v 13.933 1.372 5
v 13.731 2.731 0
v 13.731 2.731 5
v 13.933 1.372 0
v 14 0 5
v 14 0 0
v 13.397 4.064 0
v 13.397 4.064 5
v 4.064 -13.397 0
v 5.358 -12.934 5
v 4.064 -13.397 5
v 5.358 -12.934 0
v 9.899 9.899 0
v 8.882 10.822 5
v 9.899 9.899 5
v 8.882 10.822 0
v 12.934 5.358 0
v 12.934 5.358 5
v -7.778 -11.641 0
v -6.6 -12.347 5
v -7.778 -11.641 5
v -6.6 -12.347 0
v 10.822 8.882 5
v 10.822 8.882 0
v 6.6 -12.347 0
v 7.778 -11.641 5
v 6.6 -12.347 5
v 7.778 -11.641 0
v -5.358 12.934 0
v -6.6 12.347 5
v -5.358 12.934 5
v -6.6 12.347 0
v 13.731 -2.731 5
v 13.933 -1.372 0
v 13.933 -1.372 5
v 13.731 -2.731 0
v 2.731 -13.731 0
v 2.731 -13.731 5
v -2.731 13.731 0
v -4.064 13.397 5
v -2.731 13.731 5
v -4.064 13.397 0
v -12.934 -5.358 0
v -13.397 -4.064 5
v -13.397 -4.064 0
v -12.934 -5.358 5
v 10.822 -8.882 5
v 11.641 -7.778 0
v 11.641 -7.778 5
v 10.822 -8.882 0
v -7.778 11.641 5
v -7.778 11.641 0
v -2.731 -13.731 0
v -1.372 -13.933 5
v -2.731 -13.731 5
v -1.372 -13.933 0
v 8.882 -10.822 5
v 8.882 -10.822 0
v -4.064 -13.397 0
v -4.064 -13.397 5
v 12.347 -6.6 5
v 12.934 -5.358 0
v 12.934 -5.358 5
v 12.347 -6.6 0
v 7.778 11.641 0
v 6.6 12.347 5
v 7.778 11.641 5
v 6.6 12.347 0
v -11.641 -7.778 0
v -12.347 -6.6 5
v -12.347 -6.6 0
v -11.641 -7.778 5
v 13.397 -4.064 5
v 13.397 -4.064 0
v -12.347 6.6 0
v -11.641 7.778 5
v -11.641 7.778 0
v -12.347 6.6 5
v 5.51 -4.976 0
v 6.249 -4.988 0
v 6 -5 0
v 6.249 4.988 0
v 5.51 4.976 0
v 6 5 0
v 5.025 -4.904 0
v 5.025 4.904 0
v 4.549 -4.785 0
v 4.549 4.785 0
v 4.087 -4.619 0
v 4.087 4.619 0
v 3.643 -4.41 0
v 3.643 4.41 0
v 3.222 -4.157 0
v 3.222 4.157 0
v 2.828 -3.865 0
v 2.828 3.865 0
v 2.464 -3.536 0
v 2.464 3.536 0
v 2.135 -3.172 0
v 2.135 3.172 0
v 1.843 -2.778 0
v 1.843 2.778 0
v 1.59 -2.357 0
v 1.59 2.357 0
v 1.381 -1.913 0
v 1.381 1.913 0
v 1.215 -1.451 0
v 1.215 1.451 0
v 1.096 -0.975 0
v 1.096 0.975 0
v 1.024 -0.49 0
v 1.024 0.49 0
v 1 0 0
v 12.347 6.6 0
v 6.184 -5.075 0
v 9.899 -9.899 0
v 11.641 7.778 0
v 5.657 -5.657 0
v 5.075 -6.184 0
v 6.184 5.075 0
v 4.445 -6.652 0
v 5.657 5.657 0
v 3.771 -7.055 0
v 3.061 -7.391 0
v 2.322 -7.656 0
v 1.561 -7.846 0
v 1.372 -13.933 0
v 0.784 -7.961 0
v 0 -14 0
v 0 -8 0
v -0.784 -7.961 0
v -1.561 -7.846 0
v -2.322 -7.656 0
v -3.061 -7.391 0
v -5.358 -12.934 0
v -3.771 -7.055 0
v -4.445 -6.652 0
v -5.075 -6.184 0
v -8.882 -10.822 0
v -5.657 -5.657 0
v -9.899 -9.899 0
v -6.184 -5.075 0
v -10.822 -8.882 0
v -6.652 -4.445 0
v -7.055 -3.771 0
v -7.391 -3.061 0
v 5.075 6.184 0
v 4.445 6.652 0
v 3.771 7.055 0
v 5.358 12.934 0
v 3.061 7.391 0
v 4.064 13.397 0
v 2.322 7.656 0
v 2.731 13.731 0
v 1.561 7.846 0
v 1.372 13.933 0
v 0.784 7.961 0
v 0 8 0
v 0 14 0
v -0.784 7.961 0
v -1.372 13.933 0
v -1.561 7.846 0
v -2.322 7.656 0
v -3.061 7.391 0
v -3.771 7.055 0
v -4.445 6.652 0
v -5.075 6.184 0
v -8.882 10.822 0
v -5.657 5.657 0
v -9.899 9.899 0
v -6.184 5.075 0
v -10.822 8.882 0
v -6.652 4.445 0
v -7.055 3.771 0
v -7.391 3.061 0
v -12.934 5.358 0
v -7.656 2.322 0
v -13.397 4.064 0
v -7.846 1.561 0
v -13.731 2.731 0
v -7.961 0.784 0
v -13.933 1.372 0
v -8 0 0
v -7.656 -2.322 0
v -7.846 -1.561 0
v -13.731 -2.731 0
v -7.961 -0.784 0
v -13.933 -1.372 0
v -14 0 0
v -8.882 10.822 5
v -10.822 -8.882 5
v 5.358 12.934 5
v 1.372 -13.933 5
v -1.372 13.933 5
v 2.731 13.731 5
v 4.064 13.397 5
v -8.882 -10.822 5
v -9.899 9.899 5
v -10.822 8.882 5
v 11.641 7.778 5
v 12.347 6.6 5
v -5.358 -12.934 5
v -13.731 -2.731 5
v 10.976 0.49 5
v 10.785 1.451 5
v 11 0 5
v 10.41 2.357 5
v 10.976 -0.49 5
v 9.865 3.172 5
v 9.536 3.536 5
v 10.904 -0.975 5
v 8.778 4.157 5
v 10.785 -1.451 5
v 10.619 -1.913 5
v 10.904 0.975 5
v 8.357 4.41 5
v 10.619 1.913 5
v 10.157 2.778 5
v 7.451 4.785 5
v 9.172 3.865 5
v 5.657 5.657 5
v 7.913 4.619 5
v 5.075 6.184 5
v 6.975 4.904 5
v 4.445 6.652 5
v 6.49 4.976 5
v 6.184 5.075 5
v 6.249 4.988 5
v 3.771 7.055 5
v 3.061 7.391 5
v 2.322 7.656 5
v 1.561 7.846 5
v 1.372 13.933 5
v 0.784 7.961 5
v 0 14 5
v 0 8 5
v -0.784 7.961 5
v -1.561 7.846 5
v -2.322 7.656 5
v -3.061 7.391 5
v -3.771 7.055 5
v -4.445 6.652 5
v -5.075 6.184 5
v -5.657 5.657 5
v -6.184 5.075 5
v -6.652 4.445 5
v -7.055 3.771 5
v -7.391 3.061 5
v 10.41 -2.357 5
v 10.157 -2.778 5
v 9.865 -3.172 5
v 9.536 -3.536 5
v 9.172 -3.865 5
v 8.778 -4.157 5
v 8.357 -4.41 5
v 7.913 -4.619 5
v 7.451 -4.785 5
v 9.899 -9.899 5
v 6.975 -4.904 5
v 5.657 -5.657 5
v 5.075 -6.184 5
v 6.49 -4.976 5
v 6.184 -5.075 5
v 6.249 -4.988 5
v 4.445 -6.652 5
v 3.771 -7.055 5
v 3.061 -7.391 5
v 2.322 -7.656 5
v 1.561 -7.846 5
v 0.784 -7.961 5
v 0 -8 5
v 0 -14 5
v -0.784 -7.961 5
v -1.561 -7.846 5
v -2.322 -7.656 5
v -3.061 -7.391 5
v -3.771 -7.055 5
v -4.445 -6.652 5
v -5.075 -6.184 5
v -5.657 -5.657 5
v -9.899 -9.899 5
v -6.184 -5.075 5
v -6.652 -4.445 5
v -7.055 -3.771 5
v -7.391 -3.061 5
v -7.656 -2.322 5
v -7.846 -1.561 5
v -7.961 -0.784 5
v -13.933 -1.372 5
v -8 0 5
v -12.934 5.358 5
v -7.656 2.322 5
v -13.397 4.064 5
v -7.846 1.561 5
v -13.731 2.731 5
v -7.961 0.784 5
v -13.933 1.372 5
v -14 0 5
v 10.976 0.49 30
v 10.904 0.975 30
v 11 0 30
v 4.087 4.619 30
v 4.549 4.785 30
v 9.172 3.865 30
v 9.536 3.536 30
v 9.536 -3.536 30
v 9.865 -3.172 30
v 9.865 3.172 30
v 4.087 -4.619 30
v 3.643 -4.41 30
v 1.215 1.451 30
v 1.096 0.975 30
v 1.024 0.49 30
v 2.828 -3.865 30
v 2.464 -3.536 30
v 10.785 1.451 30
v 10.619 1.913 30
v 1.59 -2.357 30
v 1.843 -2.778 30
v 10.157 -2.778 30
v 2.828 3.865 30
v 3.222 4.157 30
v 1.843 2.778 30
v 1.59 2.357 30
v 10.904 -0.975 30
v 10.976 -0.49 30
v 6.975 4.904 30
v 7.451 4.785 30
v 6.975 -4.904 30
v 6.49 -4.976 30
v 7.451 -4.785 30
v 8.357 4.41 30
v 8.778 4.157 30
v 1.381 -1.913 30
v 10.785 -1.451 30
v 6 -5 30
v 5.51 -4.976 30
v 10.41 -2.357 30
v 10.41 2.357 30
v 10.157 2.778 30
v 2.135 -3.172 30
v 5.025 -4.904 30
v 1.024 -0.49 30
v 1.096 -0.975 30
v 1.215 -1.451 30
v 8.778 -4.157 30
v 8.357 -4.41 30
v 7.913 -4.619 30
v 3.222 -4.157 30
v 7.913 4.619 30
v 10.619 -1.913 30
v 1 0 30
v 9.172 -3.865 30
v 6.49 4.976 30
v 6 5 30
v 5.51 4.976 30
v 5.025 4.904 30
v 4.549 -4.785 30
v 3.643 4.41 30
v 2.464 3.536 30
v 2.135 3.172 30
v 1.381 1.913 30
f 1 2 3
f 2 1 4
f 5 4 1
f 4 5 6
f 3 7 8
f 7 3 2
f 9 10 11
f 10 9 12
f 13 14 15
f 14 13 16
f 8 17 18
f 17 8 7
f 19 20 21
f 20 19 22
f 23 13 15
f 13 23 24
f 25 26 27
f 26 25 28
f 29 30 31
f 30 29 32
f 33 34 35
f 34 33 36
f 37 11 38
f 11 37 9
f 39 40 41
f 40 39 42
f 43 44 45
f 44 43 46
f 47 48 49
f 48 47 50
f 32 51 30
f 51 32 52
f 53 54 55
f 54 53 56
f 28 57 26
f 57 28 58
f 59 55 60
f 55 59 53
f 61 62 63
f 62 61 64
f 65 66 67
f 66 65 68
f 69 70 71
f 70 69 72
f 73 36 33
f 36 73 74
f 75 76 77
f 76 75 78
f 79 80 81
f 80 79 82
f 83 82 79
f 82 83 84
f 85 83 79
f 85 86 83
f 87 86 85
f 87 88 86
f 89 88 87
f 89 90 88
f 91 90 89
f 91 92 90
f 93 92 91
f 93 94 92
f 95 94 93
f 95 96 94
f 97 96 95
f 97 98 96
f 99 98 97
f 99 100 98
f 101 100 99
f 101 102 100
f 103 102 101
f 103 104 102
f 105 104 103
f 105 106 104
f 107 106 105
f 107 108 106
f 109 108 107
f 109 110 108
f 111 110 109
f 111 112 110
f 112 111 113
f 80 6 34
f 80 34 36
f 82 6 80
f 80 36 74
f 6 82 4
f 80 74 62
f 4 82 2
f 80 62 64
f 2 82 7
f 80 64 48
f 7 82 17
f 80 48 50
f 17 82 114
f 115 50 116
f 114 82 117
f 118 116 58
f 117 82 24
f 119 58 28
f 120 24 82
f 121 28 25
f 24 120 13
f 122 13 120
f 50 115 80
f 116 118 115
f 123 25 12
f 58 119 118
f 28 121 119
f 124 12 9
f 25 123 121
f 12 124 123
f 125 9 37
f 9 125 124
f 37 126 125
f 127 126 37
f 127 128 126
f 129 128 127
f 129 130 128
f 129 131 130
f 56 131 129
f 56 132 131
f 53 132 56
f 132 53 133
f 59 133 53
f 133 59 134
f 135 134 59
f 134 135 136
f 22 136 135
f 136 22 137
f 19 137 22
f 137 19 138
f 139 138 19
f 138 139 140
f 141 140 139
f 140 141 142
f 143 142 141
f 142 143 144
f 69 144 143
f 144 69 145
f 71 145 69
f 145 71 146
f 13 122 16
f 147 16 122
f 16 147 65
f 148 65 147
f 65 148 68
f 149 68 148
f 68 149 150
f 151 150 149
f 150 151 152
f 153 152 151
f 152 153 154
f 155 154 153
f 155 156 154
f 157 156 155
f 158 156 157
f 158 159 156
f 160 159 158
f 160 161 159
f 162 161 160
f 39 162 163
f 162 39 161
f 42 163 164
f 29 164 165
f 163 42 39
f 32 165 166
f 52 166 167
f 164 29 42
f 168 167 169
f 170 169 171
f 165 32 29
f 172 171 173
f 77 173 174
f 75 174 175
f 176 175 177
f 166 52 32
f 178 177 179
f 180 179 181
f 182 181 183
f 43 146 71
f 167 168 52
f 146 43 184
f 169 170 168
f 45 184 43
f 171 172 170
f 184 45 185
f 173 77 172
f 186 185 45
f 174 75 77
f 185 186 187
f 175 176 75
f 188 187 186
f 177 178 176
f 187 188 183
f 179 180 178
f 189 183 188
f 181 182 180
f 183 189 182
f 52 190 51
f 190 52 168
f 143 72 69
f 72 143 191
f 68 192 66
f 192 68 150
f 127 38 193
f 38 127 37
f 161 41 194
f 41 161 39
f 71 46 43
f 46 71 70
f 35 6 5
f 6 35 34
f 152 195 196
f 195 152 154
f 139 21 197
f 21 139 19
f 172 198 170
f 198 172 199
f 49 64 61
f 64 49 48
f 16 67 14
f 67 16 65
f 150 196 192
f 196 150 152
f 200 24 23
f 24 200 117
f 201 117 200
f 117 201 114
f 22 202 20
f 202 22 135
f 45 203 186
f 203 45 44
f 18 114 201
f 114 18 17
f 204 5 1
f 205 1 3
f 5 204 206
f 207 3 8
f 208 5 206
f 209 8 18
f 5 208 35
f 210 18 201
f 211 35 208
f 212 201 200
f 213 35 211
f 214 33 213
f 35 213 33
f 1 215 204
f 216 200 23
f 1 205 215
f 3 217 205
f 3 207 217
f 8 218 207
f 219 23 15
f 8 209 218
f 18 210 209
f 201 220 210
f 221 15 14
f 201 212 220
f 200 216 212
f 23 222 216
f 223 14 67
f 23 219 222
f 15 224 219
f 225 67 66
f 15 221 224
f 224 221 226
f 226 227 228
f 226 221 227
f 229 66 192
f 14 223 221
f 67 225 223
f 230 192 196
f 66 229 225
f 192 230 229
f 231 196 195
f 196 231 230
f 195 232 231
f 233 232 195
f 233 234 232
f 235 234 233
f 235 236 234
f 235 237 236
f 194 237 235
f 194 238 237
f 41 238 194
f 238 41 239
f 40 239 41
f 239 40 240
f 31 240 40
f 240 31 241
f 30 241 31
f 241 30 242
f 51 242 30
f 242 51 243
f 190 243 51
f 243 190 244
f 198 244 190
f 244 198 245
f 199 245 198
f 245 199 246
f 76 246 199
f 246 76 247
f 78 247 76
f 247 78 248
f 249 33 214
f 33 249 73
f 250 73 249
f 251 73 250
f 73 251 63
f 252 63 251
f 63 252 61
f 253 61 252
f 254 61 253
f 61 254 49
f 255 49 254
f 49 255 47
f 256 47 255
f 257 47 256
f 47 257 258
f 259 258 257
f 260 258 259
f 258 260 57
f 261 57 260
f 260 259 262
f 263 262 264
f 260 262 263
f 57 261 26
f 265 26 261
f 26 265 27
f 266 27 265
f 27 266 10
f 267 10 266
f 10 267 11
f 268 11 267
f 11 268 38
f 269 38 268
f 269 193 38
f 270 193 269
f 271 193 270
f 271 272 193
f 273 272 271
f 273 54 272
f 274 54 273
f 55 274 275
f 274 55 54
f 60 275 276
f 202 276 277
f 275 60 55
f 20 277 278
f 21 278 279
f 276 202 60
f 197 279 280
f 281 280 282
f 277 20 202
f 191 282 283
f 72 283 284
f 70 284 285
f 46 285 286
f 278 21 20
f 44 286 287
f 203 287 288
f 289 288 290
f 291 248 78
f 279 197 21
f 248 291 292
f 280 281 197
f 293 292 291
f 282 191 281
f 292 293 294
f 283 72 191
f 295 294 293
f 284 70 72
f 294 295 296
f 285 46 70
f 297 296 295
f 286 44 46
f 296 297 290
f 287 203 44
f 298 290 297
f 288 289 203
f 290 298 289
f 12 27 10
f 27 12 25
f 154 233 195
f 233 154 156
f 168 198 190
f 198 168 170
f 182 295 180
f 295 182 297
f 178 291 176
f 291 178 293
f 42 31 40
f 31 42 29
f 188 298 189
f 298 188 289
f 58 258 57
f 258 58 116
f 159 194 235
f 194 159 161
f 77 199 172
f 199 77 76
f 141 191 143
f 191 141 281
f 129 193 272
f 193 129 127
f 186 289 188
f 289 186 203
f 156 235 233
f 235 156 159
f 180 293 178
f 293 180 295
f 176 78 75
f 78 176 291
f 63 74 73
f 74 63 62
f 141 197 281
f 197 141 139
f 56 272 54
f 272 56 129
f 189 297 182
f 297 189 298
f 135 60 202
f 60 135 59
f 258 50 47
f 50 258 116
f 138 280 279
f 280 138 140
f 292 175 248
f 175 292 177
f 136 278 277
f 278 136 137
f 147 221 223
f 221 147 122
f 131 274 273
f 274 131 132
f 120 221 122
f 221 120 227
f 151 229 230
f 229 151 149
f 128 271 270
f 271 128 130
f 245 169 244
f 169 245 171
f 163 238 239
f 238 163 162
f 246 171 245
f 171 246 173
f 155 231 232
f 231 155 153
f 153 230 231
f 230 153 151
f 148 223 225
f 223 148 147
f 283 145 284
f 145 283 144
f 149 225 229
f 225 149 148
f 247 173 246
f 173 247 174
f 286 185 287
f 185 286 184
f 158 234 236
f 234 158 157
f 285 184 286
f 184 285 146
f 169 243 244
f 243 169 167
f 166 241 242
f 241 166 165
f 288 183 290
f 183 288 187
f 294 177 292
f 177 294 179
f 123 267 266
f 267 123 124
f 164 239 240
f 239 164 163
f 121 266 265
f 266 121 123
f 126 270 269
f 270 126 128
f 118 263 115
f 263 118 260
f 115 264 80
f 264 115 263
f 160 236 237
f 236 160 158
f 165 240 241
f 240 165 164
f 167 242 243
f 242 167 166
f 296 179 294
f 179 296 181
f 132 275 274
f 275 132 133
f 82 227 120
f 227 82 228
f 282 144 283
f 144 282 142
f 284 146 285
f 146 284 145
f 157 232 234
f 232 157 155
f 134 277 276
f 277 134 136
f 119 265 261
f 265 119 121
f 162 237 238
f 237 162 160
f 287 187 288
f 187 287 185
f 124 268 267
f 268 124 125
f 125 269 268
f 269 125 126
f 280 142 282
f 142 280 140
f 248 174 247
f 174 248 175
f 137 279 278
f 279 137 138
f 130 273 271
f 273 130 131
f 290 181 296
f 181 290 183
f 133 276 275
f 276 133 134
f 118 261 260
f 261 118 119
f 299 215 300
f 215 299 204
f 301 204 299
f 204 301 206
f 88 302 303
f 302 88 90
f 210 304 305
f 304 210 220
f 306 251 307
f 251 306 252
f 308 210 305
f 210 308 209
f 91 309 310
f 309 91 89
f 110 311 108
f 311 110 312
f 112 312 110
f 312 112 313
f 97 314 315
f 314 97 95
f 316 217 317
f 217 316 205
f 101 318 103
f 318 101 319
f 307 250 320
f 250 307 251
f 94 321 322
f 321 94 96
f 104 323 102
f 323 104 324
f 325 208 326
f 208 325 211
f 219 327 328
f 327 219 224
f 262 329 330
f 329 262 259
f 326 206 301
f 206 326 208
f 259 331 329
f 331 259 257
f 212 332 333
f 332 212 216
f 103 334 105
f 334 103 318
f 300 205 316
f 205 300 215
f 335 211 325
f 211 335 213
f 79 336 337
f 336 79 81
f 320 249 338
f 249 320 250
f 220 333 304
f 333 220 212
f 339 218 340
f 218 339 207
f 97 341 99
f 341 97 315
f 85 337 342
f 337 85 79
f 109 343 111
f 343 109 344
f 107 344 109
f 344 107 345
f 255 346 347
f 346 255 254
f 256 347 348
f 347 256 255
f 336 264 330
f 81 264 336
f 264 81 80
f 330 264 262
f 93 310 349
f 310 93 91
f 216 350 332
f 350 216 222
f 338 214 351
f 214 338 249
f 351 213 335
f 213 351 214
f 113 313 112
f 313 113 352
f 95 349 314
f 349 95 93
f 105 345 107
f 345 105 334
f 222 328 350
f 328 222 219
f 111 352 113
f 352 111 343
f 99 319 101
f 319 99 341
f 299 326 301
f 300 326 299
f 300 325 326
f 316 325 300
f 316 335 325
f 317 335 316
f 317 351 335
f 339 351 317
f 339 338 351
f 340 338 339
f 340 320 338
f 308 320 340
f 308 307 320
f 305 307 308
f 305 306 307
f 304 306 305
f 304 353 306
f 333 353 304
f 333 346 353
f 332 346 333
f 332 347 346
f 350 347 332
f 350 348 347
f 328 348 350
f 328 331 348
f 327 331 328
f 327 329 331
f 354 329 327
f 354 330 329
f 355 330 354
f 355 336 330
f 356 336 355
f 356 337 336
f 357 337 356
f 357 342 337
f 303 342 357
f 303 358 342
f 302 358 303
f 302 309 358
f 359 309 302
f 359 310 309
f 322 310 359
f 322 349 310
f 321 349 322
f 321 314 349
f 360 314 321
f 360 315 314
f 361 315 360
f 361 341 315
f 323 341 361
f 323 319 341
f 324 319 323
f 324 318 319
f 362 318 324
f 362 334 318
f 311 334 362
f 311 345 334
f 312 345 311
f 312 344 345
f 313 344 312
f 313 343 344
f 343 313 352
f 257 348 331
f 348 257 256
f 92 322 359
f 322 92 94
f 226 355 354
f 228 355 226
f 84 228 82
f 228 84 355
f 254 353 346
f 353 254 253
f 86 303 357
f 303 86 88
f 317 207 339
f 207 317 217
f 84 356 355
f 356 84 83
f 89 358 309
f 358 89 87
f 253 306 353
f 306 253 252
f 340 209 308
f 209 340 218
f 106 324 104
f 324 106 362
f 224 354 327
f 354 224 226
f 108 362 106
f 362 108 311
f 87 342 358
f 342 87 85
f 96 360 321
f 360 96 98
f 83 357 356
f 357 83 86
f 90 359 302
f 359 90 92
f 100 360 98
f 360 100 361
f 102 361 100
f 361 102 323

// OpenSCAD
$fn=64;
linear_extrude(height=30, twist=$t*360, slices=60) translate([6,0]) circle(5);
difference(){ cylinder(r=14,h=5); translate([0,0,-1]) cylinder(r=8+4*sin($t*360),h=8); }
